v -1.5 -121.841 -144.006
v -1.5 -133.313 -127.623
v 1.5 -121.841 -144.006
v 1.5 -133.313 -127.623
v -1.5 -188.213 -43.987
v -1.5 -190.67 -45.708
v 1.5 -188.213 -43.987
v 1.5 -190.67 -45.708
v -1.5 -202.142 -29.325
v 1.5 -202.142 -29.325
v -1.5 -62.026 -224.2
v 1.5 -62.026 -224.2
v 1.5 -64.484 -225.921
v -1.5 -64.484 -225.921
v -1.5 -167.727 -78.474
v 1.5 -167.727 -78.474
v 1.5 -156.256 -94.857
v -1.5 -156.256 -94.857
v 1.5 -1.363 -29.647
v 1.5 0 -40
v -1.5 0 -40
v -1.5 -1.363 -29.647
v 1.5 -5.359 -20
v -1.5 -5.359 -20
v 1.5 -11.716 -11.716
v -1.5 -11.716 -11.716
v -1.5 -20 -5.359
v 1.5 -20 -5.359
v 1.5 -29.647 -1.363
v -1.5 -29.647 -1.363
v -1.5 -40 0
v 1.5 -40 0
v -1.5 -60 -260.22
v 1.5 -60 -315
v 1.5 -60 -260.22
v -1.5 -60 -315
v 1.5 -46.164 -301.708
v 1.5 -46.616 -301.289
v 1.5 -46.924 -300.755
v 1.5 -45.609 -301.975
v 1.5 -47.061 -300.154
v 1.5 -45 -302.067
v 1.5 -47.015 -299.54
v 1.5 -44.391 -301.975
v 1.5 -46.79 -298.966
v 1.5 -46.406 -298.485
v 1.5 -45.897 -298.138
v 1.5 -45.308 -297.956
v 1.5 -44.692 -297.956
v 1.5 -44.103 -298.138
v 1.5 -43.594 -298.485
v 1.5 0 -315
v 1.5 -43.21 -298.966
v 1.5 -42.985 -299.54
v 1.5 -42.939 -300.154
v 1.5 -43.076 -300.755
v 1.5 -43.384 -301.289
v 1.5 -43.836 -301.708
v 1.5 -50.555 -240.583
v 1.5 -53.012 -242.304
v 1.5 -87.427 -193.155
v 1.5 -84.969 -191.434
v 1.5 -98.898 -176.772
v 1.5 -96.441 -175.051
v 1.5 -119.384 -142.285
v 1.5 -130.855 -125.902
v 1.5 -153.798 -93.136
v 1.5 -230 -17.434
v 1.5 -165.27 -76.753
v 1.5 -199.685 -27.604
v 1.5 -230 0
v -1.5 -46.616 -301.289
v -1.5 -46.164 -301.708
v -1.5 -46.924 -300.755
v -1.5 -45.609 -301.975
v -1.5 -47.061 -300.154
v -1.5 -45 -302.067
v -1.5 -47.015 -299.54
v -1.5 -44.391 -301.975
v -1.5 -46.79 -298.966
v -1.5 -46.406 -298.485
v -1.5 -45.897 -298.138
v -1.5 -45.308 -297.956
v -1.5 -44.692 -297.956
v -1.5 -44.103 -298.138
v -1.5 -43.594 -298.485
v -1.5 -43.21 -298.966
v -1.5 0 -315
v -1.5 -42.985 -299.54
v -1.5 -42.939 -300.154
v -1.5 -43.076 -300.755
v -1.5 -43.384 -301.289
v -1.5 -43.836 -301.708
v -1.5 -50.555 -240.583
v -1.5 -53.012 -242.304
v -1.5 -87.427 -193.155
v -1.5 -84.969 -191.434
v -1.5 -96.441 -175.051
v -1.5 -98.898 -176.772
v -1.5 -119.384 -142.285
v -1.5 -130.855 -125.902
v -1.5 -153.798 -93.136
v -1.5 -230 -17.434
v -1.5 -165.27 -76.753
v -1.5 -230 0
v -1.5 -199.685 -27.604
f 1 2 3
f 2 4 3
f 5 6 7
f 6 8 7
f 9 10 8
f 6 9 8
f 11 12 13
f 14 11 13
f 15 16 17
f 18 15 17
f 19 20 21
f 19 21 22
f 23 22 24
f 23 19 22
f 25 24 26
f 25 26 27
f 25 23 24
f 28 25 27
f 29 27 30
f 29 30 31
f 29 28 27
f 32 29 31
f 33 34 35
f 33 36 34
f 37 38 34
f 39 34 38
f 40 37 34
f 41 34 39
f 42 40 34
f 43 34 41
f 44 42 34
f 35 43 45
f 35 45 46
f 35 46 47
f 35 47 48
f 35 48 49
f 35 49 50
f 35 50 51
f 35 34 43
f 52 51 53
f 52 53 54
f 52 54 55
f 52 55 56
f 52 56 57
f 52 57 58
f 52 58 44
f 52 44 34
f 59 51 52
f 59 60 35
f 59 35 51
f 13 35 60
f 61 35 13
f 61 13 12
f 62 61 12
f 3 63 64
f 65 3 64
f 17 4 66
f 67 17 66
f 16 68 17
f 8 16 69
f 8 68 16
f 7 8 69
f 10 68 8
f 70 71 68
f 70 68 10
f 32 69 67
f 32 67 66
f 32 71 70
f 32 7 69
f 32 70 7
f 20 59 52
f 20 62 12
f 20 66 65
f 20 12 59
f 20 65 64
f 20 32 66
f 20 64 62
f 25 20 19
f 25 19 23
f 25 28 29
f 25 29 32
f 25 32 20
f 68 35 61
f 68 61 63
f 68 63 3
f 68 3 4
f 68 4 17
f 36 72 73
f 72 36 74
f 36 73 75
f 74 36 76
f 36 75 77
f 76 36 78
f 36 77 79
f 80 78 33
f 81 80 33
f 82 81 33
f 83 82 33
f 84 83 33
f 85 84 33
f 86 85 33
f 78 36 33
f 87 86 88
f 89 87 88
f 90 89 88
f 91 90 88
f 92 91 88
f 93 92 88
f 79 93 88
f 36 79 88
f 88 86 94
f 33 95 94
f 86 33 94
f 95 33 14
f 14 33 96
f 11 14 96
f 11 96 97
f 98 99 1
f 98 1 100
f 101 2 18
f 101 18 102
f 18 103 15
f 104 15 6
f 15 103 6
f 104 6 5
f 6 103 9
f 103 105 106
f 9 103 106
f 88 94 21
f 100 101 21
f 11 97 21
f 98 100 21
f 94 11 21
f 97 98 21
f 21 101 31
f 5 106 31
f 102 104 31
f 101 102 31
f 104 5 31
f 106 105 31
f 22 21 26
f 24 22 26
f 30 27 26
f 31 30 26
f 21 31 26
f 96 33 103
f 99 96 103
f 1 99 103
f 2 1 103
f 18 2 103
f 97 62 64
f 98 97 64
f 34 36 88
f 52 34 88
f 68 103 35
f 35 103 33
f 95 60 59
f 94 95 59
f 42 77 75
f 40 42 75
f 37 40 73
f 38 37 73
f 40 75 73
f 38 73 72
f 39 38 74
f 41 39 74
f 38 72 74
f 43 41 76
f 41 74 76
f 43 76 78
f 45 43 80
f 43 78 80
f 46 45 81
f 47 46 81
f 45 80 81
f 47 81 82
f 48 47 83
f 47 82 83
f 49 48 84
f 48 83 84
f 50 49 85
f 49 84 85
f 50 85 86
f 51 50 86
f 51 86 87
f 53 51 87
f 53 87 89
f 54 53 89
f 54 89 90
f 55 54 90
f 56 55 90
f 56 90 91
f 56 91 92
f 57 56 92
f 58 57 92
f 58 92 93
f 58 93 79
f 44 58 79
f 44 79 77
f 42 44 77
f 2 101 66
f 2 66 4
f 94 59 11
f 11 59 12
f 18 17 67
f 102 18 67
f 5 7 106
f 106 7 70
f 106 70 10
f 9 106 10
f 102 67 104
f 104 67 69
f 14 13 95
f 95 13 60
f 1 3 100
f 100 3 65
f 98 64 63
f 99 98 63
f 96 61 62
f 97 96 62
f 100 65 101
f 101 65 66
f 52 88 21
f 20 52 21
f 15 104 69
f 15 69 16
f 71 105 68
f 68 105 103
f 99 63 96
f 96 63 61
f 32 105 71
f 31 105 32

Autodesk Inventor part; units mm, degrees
ref_plane "YZ Plane" through (0, 0, 0) normal (1, 0, 0) x (0, 1, 0)
ref_plane "XZ Plane" through (0, 0, 0) normal (0, 1, 0) x (-1, 0, 0)
ref_plane "XY Plane" through (0, 0, 0) normal (0, 0, 1) x (1, 0, 0)
sketch "Sketch1" plane through (0, 0, 0) normal (1, 0, 0) x (0, 1, 0)
  line L0 (0, -315) -> (0, 0)
  line L1 (-60, -315) -> (0, -315)
  line L2 (-60, -315) -> (-60, -242.7852)
  line L3 (-60, -242.7852) -> (-230, 0)
  line L4 (-230, 0) -> (0, 0)
  line L5 (-204.5995, -31.0454) -> (-193.128, -47.4284)
  line L6 (-193.128, -47.4284) -> (-195.5854, -49.1491)
  line L7 (-195.5854, -49.1491) -> (-207.0569, -32.7661)
  line L8 (-207.0569, -32.7661) -> (-204.5995, -31.0454)
  line L9 (-230, -17.4345) -> (-60, -260.2196)
  line L10 (-230, 0) -> (-230, -17.4345)
  point P0 (-45, -305)
  point P1 (-201.3212, -40.9576)
  point P2 (-198.8637, -39.2369)
  dimension "d0" = 60
  dimension "d7" = 15
  dimension "d47" = 315
  dimension "d48" = 230
  dimension "d49" = 55
  dimension "d51" = 3
  dimension "d52" = 20
  dimension "d54" = 40
  dimension "d59" = 10
  dimension "d60" = 0
  dimension "d63" = 10
extrude "Extrusion1" add sketch "Sketch1" along normal mid plane 3
sketch "Sketch2" plane through (1.5, 0, 0) normal (1, 0, 0) x (0, 0, -1)
  line L0 (29.3246, -202.142) -> (45.7077, -190.6705)
  line L1 (45.7077, -190.6705) -> (43.9869, -188.213)
  line L2 (43.9869, -188.213) -> (27.6039, -199.6846)
  line L3 (27.6039, -199.6846) -> (29.3246, -202.142)
  line L4 (0, 0) -> (0, -230) construction
  line L5 (17.4345, -230) -> (260.2196, -60) projected
  line L6 (29.3246, -202.142) -> (0, -221.4287) construction
  dimension "d24" = 3
  dimension "d25" = 20
  dimension "d55" = 40
  dimension "d61" = 16
  dimension "d67" = 35.0986
extrude "Extrusion2" cut sketch "Sketch2" against normal blind 3
pattern_linear "Rectangular Pattern1" count 5 spacing 60 along (0, 0.5736, -0.8192) of "Extrusion2"
sketch "Sketch3" plane through (1.5, 0, 0) normal (1, 0, 0) x (0, 0, -1)
  line L0 (315, -60) -> (315, 0) projected
  line L1 (315, 0) -> (0, 0) projected
  line L2 (260.2196, -60) -> (315, -60) projected
  point P0 (300, -45)
  dimension "d64" = 15
  dimension "d65" = 15
hole "Hole3" at (1.5, -45, -300) direction (-1, 0, 0) diameter 4.134 end through all thread size "M5x0.8" class "6H" standard "ISO Metric profile"
fillet "Fillet1" radius 40 1 edges at (0, 0, 0)
properties part number "2309HCMUTE-CDT23_VACH-NGAN" material "PMMA Plastic"
